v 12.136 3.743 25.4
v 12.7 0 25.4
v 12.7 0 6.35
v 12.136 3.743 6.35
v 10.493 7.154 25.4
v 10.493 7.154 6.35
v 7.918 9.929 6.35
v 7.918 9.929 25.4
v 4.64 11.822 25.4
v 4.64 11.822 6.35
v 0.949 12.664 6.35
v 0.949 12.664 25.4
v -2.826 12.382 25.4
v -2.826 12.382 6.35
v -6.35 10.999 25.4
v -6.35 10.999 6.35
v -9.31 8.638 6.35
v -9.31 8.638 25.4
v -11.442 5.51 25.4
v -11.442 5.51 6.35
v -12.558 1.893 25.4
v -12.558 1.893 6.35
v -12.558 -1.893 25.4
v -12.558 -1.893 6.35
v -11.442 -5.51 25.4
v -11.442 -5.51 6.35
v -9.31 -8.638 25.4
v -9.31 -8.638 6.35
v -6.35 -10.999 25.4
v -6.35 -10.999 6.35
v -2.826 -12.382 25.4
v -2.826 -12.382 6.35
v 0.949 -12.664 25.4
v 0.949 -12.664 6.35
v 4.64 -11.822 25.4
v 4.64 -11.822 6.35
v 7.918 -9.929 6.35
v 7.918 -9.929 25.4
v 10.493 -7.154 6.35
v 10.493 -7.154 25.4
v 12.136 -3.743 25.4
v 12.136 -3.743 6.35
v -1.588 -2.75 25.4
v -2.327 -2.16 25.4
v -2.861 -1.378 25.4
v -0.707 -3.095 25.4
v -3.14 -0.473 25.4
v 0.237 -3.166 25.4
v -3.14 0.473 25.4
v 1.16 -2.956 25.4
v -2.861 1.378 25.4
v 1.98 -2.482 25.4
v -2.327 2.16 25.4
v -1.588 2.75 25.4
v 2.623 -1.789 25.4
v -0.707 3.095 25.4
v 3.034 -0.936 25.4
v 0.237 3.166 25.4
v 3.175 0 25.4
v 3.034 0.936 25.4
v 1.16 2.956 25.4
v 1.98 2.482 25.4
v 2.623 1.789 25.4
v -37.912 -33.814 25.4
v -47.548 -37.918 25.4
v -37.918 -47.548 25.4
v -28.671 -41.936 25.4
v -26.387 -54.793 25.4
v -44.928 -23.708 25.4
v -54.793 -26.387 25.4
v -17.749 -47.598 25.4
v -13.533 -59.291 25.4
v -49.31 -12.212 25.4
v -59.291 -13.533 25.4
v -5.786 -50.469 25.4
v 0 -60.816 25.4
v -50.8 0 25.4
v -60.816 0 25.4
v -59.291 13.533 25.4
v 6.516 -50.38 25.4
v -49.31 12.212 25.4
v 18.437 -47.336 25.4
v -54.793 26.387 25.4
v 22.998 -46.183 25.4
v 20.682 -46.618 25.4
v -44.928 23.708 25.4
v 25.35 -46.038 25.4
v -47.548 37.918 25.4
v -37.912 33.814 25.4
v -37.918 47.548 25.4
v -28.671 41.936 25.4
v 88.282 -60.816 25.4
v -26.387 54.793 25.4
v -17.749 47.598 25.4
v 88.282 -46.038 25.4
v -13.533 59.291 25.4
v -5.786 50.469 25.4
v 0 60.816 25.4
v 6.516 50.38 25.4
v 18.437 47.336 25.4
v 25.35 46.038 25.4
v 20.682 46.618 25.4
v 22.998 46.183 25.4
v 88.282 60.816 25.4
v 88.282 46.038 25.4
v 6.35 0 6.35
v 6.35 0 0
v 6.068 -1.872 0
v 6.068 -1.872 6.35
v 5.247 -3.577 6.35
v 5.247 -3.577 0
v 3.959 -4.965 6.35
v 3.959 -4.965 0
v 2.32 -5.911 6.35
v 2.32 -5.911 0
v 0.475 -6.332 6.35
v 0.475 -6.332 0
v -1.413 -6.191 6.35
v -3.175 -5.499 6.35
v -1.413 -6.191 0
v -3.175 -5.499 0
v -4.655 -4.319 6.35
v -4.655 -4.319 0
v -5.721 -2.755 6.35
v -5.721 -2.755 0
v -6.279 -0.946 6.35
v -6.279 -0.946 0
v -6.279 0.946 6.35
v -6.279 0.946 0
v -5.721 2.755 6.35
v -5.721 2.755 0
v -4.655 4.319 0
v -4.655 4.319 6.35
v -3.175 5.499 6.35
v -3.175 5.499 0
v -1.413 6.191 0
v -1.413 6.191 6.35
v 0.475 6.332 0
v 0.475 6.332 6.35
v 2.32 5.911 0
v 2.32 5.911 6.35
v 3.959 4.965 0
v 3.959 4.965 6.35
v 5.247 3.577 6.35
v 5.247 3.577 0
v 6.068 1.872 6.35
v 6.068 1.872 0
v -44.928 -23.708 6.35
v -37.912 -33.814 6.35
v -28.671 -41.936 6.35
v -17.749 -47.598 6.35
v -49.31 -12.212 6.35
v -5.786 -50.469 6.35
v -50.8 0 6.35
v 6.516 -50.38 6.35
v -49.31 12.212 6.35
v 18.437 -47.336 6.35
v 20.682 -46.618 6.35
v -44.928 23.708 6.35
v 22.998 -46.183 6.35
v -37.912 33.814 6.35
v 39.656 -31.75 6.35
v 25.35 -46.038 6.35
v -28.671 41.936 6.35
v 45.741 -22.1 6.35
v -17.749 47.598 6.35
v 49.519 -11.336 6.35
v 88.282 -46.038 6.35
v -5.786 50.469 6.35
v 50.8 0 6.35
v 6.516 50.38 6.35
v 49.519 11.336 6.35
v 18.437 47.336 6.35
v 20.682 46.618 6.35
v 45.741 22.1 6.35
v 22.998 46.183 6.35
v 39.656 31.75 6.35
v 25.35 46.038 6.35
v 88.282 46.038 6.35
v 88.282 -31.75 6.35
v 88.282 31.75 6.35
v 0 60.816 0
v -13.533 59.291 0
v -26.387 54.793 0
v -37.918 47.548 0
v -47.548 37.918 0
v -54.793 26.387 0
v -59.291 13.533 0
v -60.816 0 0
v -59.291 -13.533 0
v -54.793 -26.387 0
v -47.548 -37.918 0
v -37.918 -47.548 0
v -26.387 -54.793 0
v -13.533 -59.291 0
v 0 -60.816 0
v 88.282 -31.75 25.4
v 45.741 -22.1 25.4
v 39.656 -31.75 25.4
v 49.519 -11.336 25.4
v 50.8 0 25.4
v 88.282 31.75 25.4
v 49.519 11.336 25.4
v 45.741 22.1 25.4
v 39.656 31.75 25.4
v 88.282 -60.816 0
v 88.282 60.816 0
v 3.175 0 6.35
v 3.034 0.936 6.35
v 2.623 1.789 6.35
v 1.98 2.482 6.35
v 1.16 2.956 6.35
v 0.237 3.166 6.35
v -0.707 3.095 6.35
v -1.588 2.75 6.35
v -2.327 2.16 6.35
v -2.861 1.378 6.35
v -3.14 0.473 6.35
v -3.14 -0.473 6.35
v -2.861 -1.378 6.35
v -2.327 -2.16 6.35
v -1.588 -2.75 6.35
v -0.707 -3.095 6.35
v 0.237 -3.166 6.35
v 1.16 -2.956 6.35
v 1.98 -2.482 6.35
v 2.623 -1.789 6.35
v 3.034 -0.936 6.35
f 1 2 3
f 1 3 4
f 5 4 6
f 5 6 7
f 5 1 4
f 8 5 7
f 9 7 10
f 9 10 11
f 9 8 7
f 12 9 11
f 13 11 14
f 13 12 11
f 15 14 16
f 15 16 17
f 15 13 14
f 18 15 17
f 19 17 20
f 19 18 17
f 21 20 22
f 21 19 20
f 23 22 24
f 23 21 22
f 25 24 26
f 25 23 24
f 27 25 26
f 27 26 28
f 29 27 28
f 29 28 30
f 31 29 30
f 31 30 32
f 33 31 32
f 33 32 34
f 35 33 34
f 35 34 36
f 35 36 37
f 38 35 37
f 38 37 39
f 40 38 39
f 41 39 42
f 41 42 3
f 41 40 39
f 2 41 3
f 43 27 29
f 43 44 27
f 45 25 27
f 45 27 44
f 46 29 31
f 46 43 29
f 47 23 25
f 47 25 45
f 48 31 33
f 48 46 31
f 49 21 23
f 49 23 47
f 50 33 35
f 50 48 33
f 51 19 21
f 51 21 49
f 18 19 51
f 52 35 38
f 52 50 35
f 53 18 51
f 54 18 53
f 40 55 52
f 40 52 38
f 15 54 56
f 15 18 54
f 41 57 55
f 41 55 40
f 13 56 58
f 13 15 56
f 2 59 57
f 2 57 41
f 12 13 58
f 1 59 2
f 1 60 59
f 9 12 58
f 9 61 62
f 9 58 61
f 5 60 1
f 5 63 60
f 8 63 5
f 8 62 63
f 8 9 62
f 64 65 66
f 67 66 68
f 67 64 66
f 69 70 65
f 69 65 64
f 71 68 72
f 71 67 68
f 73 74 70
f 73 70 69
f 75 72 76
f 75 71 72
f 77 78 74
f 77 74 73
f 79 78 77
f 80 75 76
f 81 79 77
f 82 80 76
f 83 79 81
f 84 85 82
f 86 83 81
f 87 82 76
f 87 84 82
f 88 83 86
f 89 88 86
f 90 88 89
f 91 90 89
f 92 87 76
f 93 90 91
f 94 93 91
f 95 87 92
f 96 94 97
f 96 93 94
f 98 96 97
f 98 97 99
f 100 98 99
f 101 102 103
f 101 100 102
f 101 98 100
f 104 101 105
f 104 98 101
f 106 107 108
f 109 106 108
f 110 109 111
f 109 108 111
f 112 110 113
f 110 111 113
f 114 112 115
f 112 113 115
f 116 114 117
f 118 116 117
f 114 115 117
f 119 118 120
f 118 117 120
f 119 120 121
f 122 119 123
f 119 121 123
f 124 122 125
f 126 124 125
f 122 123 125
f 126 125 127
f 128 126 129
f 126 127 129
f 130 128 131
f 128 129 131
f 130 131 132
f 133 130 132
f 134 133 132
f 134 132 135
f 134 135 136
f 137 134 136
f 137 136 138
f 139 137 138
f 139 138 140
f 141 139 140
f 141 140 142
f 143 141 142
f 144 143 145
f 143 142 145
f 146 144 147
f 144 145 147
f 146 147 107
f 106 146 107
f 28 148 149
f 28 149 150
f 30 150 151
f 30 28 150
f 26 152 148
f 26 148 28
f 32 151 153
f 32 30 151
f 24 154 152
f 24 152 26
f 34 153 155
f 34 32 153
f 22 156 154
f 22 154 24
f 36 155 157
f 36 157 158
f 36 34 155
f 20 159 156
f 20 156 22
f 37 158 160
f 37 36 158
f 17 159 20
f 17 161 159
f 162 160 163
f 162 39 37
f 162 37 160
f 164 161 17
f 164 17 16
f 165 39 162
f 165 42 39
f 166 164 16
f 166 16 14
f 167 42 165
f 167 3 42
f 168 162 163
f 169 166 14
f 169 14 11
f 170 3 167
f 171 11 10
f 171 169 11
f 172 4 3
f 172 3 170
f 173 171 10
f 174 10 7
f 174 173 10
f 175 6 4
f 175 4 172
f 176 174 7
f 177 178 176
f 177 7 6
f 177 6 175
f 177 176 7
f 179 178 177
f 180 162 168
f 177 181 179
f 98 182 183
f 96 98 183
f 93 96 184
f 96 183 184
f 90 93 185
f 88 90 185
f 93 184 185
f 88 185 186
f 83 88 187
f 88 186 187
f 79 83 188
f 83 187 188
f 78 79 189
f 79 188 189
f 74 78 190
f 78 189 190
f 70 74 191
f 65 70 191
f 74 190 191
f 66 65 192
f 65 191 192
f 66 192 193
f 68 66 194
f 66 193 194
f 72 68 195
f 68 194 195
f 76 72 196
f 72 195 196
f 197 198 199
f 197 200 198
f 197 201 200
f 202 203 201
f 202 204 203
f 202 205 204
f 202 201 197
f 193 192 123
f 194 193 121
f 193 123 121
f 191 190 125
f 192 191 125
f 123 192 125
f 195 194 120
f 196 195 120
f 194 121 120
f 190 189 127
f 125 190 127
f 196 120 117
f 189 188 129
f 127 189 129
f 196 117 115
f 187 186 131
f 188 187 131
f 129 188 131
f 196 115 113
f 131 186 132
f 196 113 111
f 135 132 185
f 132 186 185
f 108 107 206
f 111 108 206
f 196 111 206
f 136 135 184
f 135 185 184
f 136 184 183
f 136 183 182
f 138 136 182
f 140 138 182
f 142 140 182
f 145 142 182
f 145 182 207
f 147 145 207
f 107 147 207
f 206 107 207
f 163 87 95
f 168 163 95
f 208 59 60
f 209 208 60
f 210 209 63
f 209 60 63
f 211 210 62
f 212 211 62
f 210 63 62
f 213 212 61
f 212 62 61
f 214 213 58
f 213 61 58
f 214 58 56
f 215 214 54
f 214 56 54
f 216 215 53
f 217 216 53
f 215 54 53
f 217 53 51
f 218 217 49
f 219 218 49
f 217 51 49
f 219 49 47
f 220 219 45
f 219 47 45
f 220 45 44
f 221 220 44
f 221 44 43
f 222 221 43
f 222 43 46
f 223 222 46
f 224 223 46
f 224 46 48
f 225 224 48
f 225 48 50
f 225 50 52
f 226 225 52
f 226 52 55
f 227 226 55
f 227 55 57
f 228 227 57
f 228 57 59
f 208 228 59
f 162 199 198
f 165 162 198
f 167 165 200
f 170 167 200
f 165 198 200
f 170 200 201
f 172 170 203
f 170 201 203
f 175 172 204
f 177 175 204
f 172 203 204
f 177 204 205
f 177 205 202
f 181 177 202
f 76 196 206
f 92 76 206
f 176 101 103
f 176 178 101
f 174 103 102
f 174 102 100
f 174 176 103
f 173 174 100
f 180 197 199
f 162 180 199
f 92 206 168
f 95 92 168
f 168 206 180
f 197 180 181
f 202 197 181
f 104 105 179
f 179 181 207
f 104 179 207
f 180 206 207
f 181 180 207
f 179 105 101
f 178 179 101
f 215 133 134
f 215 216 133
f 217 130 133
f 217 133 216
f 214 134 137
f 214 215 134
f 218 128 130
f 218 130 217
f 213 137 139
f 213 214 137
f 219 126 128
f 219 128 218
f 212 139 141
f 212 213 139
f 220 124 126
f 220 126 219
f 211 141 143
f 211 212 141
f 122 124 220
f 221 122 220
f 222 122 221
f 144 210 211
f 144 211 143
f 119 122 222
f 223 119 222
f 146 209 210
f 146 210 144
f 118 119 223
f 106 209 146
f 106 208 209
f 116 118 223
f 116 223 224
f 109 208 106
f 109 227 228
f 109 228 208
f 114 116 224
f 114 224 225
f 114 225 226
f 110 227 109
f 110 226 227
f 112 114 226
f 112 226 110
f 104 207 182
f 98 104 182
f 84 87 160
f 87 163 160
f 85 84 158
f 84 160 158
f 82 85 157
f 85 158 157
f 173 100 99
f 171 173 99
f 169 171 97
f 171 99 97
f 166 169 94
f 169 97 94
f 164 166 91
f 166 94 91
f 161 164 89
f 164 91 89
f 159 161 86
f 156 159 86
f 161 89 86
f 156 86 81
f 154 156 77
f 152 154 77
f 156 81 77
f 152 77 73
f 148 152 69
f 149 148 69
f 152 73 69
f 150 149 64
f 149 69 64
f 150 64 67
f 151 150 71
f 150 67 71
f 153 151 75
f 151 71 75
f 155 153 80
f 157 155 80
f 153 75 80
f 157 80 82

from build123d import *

# Parameters (mm, degrees)
F1_DEPTH = 25.4
F2_R     = 12.7
F3_DEPTH = 19.05
F4_R     = 19.05
F2_R_2   = 3.175
F5_DEPTH = 25.4
F6_R     = 6.35
F7_DEPTH = 6.35


with BuildPart() as f1:
    # F0 (on Top) → F1 (new body)
    with BuildSketch(Plane.XY):
        with BuildLine():
            Line((88.281516, 60.815624), (0, 60.815624))
            ThreePointArc((0, 60.815624), (-60.815624, 0), (0, -60.815624))
            Line((0, -60.815624), (88.281516, -60.815624))
            Line((88.281516, -60.815624), (88.281516, 60.815624))
        make_face()
    extrude(amount=F1_DEPTH)

    # F2 (on face) → F3 (cut)
    with BuildSketch(Plane.XY.offset(25.4)):
        with BuildLine():
            Line((88.281516, 46.0375), (21.475302, 46.0375))
            ThreePointArc((21.475302, 46.0375), (-50.8, 0), (21.475302, -46.0375))
            Line((21.475302, -46.0375), (88.281516, -46.0375))
            Line((88.281516, -46.0375), (88.281516, -31.75))
            Line((88.281516, -31.75), (39.655737, -31.75))
            ThreePointArc((39.655737, -31.75), (50.8, 0), (39.655737, 31.75))
            Line((39.655737, 31.75), (88.281516, 31.75))
            Line((88.281516, 31.75), (88.281516, 46.0375))
        make_face()
        Circle(F2_R, mode=Mode.SUBTRACT)
    extrude(amount=-F3_DEPTH, mode=Mode.SUBTRACT)

    # F4
    f4_edges = [f1.edges().sort_by_distance(p)[0] for p in [
        (21.475302, 46.0375, 15.875),
        (21.475302, -46.0375, 15.875),
    ]]
    fillet(f4_edges, radius=F4_R)

    # F2 (on face) → F5 (cut)
    with BuildSketch(Plane.XY.offset(25.4)):
        Circle(F2_R_2)
    extrude(amount=-F5_DEPTH, mode=Mode.SUBTRACT)

    # F6 (on face) → F7 (cut)
    with BuildSketch(Plane(origin=(0, 0, 0), x_dir=(1, 0, 0), z_dir=(0, 0, -1))):
        Circle(F6_R)
    extrude(amount=-F7_DEPTH, mode=Mode.SUBTRACT)


solid = f1.part
